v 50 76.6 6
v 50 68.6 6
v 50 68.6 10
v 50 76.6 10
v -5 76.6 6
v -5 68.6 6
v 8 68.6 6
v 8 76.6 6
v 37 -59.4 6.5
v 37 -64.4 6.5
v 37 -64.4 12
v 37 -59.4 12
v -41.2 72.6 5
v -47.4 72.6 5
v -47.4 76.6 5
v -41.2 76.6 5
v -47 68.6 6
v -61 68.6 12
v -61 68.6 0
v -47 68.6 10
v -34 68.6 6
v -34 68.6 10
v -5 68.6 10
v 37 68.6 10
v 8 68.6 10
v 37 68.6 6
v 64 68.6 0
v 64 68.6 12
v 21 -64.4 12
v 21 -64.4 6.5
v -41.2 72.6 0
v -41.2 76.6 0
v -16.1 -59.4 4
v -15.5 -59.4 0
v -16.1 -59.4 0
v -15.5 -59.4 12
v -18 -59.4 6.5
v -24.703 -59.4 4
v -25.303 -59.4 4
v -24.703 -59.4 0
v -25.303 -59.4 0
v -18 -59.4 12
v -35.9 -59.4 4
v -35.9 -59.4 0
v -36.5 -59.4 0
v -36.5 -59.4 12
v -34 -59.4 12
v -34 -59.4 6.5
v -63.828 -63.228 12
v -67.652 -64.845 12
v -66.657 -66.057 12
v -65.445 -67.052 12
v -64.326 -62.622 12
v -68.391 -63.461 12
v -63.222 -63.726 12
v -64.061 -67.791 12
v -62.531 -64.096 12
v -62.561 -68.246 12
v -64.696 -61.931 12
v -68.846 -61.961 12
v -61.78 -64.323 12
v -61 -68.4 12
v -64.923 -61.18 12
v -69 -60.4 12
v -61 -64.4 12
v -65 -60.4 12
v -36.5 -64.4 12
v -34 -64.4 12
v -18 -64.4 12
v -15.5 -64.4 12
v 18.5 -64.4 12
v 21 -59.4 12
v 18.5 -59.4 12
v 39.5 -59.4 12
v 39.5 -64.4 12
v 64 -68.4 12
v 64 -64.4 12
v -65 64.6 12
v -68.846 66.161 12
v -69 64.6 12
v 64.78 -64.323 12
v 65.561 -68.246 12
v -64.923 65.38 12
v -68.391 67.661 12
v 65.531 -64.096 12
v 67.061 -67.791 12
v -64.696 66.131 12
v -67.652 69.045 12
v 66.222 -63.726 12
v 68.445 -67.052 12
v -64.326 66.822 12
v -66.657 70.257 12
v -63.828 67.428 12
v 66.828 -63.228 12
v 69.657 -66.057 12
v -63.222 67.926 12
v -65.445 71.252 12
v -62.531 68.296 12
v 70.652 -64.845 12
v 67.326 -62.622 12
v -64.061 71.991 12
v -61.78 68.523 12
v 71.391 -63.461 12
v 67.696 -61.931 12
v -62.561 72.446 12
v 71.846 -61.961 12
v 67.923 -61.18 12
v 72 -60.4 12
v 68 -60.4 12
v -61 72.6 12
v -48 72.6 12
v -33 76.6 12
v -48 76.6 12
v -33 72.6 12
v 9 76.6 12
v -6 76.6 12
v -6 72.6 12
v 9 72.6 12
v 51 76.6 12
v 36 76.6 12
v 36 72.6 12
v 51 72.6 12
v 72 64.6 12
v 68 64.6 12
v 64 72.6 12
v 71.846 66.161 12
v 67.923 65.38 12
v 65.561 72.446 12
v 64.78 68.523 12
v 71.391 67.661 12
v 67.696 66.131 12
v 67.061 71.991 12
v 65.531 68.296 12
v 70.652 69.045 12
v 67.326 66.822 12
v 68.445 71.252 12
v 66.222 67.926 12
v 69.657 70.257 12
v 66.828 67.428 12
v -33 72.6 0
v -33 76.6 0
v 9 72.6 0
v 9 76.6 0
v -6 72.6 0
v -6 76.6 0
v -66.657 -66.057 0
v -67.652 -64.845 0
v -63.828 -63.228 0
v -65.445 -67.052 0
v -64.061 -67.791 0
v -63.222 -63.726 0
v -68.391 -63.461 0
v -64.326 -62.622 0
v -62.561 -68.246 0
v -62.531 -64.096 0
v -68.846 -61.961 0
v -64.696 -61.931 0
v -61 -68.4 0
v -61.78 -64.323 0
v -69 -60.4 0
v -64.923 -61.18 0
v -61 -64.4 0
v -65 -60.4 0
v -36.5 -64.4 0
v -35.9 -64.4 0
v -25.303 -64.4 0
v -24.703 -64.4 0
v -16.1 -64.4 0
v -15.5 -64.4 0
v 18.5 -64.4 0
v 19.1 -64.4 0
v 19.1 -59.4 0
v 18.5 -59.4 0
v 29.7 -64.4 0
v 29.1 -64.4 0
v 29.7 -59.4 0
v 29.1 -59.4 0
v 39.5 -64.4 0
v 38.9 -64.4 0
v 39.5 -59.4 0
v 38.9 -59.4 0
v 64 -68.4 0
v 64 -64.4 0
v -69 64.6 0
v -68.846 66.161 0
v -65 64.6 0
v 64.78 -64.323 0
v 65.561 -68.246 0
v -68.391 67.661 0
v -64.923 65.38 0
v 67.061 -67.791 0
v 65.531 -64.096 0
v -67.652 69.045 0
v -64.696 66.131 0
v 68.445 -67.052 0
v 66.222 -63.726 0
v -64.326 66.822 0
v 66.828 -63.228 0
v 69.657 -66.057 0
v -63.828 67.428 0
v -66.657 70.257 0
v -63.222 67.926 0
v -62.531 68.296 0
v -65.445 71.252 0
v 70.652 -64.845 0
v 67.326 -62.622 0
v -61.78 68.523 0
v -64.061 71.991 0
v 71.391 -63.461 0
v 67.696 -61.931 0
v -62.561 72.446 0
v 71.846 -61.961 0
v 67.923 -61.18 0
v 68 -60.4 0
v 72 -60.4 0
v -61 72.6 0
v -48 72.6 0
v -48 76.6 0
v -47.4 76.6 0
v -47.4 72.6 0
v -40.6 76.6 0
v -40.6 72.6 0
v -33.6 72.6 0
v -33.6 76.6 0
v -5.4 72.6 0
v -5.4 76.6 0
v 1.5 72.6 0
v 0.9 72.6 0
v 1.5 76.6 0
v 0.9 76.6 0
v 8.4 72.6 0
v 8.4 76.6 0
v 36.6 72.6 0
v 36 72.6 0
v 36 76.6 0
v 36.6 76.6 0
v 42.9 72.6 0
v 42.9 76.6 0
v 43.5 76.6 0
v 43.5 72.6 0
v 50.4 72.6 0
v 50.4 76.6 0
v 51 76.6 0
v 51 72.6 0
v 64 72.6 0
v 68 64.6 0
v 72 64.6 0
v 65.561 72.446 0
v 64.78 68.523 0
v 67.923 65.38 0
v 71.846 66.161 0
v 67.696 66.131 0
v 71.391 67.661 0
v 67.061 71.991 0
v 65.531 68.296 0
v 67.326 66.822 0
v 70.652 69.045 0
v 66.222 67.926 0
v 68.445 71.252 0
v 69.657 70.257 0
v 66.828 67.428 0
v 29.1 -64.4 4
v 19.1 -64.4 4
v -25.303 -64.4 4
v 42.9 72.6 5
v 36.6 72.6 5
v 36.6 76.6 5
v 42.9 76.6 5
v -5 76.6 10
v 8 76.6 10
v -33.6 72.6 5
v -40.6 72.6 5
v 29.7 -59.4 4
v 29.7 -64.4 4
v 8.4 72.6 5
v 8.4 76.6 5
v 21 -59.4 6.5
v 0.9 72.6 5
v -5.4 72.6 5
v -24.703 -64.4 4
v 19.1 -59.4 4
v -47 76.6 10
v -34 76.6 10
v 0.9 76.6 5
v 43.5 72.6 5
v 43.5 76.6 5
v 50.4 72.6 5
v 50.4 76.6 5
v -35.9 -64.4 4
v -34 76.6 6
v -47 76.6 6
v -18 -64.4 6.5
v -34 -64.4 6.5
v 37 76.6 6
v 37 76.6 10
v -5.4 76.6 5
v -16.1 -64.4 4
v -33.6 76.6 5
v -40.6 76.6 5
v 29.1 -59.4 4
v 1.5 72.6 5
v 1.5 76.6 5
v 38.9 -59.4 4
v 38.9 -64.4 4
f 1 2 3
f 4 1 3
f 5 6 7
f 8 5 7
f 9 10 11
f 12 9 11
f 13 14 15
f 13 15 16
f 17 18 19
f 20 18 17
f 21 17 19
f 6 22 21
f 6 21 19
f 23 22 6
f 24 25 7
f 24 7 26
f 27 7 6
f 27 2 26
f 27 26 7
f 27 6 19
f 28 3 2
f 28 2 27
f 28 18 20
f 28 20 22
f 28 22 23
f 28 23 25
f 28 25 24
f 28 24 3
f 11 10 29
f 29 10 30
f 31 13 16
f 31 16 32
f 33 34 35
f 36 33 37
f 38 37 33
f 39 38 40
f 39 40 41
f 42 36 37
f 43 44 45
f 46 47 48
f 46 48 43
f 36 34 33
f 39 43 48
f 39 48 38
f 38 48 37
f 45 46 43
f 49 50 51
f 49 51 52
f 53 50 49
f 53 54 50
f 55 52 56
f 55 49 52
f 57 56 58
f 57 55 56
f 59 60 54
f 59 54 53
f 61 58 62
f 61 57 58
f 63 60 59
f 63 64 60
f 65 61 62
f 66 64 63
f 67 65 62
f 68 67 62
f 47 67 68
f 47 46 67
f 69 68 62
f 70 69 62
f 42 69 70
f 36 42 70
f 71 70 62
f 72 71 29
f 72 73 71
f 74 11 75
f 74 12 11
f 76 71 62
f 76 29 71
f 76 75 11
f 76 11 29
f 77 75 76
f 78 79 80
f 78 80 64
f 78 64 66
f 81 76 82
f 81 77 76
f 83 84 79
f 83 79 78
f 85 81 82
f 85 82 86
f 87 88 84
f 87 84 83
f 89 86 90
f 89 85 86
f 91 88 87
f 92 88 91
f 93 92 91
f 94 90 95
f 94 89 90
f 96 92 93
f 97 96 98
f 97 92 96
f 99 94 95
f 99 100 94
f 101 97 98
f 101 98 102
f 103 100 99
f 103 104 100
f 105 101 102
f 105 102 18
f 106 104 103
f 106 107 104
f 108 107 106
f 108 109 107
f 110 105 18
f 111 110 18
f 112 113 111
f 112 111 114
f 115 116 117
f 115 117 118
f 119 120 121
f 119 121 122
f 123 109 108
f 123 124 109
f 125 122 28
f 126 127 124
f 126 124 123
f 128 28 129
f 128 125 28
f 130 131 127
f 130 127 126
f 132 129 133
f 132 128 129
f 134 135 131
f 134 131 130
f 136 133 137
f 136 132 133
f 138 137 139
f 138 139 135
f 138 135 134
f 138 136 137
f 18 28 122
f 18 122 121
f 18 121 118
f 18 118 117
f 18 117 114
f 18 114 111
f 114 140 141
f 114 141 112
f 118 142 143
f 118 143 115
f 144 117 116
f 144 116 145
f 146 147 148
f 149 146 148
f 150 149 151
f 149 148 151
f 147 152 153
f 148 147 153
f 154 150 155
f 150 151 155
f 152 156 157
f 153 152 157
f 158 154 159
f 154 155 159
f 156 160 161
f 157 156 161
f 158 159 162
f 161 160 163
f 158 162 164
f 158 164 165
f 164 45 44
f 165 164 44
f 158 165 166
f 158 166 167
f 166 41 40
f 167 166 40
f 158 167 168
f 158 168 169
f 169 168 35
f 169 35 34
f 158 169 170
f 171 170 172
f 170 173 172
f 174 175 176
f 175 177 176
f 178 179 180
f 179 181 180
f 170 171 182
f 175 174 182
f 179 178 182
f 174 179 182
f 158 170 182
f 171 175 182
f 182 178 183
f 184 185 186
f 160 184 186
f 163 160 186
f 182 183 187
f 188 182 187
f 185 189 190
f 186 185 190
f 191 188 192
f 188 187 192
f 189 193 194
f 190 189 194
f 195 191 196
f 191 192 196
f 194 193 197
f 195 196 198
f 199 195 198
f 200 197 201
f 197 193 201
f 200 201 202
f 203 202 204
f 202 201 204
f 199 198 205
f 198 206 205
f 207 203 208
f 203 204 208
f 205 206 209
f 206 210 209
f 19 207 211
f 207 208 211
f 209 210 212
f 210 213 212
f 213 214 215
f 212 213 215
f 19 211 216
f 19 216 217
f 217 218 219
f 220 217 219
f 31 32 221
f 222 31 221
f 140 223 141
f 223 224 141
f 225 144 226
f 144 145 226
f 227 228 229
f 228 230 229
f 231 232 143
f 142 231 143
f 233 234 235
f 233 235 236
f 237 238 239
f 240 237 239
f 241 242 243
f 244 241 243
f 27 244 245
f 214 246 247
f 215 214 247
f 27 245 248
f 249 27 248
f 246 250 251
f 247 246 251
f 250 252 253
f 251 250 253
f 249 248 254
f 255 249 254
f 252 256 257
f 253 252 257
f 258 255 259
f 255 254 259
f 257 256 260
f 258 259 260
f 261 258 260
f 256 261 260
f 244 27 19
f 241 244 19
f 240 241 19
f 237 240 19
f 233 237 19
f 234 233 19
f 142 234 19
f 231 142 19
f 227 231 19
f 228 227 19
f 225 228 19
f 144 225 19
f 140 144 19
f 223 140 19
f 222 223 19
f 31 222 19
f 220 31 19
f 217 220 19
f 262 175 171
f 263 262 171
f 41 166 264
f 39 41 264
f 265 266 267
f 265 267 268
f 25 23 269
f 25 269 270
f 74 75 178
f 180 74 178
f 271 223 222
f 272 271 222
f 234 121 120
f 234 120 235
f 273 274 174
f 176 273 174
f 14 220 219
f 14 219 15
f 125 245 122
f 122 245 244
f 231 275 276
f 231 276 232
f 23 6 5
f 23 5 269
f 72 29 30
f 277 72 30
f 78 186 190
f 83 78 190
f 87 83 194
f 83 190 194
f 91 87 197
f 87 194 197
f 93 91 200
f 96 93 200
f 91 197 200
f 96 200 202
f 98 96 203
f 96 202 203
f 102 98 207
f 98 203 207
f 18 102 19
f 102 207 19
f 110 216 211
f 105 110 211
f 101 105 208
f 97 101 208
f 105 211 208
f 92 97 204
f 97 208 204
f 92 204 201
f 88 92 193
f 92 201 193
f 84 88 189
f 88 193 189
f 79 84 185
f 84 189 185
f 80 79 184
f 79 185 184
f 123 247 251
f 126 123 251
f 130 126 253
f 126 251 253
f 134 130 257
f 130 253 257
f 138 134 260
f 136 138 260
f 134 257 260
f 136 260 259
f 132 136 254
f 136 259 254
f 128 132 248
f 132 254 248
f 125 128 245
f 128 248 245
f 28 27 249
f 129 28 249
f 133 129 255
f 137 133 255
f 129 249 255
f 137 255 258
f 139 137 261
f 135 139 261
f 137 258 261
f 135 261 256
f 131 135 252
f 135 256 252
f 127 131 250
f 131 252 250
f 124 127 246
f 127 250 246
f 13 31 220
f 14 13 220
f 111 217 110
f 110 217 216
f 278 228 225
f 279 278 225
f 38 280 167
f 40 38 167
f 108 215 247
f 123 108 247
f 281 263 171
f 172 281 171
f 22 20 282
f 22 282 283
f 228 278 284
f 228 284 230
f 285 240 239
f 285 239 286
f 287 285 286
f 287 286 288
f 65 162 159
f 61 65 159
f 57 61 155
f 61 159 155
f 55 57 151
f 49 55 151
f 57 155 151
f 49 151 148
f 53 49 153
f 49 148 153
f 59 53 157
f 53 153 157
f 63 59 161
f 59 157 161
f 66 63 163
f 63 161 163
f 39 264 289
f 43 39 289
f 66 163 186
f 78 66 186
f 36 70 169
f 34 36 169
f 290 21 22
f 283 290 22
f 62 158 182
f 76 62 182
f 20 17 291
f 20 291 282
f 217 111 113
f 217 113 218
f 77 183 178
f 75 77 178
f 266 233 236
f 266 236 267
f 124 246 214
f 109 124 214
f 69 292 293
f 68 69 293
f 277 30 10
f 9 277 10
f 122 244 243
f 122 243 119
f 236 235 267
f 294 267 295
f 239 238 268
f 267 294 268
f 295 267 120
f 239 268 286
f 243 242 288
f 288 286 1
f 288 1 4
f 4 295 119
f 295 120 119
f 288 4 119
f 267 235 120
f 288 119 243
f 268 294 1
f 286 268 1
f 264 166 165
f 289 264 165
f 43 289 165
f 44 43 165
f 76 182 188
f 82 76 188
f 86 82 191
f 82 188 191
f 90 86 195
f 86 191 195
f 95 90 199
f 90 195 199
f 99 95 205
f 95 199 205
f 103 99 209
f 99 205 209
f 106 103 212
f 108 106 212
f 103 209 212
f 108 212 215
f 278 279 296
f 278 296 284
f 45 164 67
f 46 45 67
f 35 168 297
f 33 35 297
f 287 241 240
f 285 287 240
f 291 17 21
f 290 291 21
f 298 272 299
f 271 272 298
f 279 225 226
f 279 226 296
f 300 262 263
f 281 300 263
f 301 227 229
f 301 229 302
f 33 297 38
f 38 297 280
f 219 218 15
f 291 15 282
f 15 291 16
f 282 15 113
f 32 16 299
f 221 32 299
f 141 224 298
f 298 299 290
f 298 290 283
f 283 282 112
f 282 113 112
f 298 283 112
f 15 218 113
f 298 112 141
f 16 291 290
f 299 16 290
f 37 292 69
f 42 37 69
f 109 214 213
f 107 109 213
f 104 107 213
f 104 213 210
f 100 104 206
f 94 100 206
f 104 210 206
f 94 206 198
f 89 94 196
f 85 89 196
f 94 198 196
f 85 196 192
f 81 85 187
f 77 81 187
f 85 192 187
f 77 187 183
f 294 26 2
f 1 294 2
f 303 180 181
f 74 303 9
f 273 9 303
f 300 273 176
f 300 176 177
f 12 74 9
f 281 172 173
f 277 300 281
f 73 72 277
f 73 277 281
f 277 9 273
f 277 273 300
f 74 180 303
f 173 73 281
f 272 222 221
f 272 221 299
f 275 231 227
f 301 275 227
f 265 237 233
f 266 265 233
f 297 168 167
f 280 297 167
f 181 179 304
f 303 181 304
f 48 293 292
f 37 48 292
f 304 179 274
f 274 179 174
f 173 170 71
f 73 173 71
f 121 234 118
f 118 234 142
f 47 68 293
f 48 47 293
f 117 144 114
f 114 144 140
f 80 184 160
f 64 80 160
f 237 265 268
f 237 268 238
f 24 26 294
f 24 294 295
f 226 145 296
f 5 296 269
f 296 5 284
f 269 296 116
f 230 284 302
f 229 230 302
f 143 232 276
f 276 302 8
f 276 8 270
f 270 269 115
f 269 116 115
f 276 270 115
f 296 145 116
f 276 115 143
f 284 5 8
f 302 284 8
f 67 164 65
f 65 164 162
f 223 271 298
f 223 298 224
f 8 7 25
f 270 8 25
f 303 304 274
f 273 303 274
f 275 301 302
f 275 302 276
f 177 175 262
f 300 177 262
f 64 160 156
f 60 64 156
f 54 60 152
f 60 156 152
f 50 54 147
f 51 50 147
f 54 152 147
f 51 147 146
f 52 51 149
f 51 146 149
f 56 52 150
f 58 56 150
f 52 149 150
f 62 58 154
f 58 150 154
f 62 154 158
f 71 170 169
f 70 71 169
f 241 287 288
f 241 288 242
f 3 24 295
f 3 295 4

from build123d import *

# Parameters (mm, degrees)
F1_DEPTH = 12
F2_W     = 13
F2_H     = 4
F3_DEPTH = 8
F4_DEPTH = 25
F6_DEPTH = 5


with BuildPart() as f1:
    # F0 (on Top) → F1 (new body)
    with BuildSketch(Plane.XY):
        with BuildLine():
            Line((64, 72.6), (-61, 72.6))
            ThreePointArc((-61, 72.6), (-66.656854, 70.256854), (-69, 64.6))
            Line((-69, 64.6), (-69, -60.4))
            ThreePointArc((-69, -60.4), (-66.656854, -66.056855), (-61, -68.4))
            Line((-61, -68.4), (64, -68.4))
            ThreePointArc((64, -68.4), (69.656854, -66.056855), (72, -60.4))
            Line((72, -60.4), (72, 64.6))
            ThreePointArc((72, 64.6), (69.656854, 70.256854), (64, 72.6))
        make_face()
        with BuildLine():
            Line((64, -64.4), (-61, -64.4))
            ThreePointArc((-61, -64.4), (-63.828427, -63.228428), (-65, -60.4))
            Line((-65, -60.4), (-65, 64.6))
            ThreePointArc((-65, 64.6), (-63.828427, 67.428427), (-61, 68.6))
            Line((-61, 68.6), (64, 68.6))
            ThreePointArc((64, 68.6), (66.828427, 67.428427), (68, 64.6))
            Line((68, 64.6), (68, -60.4))
            ThreePointArc((68, -60.4), (66.828427, -63.228428), (64, -64.4))
        make_face(mode=Mode.SUBTRACT)
    extrude(amount=F1_DEPTH)

    # F2 (on face) → F3 (join)
    with BuildSketch(Plane.XZ.offset(-68.6)):
        Polygon((-48, 12), (-48, 6), (-48, 0), (-47.4, 0), (-47.4, 5), (-41.2, 5), (-41.2, 0), (-40.6, 0), (-40.6, 5), (-33.6, 5), (-33.6, 0), (-33, 0), (-33, 12), align=None)
        with Locations((-40.5, 8)):
            Rectangle(F2_W, F2_H, mode=Mode.SUBTRACT)
        Polygon((9, 12), (-6, 12), (-6, 6), (-6, 0), (-5.4, 0), (-5.4, 5), (0.9, 5), (0.9, 0), (1.5, 0), (1.5, 5), (8.4, 5), (8.4, 0), (9, 0), align=None)
        with Locations((1.5, 8)):
            Rectangle(F2_W, F2_H, mode=Mode.SUBTRACT)
        Polygon((51, 12), (36, 12), (36, 0), (36.6, 0), (36.6, 5), (42.9, 5), (42.9, 0), (43.5, 0), (43.5, 5), (50.4, 5), (50.4, 0), (51, 0), (51, 6), align=None)
        with Locations((43.5, 8)):
            Rectangle(F2_W, F2_H, mode=Mode.SUBTRACT)
    extrude(amount=-F3_DEPTH)

    # F2 (on face) → F4 (cut)
    with BuildSketch(Plane.XZ.offset(-68.6)):
        with Locations((43.5, 8)):
            Rectangle(F2_W, F2_H)
        with Locations((1.5, 8)):
            Rectangle(F2_W, F2_H)
        with Locations((-40.5, 8)):
            Rectangle(F2_W, F2_H)
    extrude(amount=-F4_DEPTH, mode=Mode.SUBTRACT)

    # F5 (on face) → F6 (join)
    with BuildSketch(Plane(origin=(0, -64.4, 0), x_dir=(-1, 0, 0), z_dir=(0, 1, 0))):
        Polygon((-18.5, 4), (-18.5, 12), (-21, 12), (-21, 6.5), (-37, 6.5), (-37, 12), (-39.5, 12), (-39.5, 4), (-39.5, 0), (-38.9, 0), (-38.9, 4), (-29.7, 4), (-29.7, 0), (-29.1, 0), (-29.1, 4), (-19.1, 4), (-19.1, 0), (-18.5, 0), align=None)
        Polygon((18, 12), (15.5, 12), (15.5, 4), (15.5, 0), (16.1, 0), (16.1, 4), (24.702823, 4), (24.702823, 0), (25.302823, 0), (25.302823, 4), (35.9, 4), (35.9, 0), (36.5, 0), (36.5, 4), (36.5, 12), (34, 12), (34, 6.5), (18, 6.5), align=None)
    extrude(amount=F6_DEPTH)


solid = f1.part
